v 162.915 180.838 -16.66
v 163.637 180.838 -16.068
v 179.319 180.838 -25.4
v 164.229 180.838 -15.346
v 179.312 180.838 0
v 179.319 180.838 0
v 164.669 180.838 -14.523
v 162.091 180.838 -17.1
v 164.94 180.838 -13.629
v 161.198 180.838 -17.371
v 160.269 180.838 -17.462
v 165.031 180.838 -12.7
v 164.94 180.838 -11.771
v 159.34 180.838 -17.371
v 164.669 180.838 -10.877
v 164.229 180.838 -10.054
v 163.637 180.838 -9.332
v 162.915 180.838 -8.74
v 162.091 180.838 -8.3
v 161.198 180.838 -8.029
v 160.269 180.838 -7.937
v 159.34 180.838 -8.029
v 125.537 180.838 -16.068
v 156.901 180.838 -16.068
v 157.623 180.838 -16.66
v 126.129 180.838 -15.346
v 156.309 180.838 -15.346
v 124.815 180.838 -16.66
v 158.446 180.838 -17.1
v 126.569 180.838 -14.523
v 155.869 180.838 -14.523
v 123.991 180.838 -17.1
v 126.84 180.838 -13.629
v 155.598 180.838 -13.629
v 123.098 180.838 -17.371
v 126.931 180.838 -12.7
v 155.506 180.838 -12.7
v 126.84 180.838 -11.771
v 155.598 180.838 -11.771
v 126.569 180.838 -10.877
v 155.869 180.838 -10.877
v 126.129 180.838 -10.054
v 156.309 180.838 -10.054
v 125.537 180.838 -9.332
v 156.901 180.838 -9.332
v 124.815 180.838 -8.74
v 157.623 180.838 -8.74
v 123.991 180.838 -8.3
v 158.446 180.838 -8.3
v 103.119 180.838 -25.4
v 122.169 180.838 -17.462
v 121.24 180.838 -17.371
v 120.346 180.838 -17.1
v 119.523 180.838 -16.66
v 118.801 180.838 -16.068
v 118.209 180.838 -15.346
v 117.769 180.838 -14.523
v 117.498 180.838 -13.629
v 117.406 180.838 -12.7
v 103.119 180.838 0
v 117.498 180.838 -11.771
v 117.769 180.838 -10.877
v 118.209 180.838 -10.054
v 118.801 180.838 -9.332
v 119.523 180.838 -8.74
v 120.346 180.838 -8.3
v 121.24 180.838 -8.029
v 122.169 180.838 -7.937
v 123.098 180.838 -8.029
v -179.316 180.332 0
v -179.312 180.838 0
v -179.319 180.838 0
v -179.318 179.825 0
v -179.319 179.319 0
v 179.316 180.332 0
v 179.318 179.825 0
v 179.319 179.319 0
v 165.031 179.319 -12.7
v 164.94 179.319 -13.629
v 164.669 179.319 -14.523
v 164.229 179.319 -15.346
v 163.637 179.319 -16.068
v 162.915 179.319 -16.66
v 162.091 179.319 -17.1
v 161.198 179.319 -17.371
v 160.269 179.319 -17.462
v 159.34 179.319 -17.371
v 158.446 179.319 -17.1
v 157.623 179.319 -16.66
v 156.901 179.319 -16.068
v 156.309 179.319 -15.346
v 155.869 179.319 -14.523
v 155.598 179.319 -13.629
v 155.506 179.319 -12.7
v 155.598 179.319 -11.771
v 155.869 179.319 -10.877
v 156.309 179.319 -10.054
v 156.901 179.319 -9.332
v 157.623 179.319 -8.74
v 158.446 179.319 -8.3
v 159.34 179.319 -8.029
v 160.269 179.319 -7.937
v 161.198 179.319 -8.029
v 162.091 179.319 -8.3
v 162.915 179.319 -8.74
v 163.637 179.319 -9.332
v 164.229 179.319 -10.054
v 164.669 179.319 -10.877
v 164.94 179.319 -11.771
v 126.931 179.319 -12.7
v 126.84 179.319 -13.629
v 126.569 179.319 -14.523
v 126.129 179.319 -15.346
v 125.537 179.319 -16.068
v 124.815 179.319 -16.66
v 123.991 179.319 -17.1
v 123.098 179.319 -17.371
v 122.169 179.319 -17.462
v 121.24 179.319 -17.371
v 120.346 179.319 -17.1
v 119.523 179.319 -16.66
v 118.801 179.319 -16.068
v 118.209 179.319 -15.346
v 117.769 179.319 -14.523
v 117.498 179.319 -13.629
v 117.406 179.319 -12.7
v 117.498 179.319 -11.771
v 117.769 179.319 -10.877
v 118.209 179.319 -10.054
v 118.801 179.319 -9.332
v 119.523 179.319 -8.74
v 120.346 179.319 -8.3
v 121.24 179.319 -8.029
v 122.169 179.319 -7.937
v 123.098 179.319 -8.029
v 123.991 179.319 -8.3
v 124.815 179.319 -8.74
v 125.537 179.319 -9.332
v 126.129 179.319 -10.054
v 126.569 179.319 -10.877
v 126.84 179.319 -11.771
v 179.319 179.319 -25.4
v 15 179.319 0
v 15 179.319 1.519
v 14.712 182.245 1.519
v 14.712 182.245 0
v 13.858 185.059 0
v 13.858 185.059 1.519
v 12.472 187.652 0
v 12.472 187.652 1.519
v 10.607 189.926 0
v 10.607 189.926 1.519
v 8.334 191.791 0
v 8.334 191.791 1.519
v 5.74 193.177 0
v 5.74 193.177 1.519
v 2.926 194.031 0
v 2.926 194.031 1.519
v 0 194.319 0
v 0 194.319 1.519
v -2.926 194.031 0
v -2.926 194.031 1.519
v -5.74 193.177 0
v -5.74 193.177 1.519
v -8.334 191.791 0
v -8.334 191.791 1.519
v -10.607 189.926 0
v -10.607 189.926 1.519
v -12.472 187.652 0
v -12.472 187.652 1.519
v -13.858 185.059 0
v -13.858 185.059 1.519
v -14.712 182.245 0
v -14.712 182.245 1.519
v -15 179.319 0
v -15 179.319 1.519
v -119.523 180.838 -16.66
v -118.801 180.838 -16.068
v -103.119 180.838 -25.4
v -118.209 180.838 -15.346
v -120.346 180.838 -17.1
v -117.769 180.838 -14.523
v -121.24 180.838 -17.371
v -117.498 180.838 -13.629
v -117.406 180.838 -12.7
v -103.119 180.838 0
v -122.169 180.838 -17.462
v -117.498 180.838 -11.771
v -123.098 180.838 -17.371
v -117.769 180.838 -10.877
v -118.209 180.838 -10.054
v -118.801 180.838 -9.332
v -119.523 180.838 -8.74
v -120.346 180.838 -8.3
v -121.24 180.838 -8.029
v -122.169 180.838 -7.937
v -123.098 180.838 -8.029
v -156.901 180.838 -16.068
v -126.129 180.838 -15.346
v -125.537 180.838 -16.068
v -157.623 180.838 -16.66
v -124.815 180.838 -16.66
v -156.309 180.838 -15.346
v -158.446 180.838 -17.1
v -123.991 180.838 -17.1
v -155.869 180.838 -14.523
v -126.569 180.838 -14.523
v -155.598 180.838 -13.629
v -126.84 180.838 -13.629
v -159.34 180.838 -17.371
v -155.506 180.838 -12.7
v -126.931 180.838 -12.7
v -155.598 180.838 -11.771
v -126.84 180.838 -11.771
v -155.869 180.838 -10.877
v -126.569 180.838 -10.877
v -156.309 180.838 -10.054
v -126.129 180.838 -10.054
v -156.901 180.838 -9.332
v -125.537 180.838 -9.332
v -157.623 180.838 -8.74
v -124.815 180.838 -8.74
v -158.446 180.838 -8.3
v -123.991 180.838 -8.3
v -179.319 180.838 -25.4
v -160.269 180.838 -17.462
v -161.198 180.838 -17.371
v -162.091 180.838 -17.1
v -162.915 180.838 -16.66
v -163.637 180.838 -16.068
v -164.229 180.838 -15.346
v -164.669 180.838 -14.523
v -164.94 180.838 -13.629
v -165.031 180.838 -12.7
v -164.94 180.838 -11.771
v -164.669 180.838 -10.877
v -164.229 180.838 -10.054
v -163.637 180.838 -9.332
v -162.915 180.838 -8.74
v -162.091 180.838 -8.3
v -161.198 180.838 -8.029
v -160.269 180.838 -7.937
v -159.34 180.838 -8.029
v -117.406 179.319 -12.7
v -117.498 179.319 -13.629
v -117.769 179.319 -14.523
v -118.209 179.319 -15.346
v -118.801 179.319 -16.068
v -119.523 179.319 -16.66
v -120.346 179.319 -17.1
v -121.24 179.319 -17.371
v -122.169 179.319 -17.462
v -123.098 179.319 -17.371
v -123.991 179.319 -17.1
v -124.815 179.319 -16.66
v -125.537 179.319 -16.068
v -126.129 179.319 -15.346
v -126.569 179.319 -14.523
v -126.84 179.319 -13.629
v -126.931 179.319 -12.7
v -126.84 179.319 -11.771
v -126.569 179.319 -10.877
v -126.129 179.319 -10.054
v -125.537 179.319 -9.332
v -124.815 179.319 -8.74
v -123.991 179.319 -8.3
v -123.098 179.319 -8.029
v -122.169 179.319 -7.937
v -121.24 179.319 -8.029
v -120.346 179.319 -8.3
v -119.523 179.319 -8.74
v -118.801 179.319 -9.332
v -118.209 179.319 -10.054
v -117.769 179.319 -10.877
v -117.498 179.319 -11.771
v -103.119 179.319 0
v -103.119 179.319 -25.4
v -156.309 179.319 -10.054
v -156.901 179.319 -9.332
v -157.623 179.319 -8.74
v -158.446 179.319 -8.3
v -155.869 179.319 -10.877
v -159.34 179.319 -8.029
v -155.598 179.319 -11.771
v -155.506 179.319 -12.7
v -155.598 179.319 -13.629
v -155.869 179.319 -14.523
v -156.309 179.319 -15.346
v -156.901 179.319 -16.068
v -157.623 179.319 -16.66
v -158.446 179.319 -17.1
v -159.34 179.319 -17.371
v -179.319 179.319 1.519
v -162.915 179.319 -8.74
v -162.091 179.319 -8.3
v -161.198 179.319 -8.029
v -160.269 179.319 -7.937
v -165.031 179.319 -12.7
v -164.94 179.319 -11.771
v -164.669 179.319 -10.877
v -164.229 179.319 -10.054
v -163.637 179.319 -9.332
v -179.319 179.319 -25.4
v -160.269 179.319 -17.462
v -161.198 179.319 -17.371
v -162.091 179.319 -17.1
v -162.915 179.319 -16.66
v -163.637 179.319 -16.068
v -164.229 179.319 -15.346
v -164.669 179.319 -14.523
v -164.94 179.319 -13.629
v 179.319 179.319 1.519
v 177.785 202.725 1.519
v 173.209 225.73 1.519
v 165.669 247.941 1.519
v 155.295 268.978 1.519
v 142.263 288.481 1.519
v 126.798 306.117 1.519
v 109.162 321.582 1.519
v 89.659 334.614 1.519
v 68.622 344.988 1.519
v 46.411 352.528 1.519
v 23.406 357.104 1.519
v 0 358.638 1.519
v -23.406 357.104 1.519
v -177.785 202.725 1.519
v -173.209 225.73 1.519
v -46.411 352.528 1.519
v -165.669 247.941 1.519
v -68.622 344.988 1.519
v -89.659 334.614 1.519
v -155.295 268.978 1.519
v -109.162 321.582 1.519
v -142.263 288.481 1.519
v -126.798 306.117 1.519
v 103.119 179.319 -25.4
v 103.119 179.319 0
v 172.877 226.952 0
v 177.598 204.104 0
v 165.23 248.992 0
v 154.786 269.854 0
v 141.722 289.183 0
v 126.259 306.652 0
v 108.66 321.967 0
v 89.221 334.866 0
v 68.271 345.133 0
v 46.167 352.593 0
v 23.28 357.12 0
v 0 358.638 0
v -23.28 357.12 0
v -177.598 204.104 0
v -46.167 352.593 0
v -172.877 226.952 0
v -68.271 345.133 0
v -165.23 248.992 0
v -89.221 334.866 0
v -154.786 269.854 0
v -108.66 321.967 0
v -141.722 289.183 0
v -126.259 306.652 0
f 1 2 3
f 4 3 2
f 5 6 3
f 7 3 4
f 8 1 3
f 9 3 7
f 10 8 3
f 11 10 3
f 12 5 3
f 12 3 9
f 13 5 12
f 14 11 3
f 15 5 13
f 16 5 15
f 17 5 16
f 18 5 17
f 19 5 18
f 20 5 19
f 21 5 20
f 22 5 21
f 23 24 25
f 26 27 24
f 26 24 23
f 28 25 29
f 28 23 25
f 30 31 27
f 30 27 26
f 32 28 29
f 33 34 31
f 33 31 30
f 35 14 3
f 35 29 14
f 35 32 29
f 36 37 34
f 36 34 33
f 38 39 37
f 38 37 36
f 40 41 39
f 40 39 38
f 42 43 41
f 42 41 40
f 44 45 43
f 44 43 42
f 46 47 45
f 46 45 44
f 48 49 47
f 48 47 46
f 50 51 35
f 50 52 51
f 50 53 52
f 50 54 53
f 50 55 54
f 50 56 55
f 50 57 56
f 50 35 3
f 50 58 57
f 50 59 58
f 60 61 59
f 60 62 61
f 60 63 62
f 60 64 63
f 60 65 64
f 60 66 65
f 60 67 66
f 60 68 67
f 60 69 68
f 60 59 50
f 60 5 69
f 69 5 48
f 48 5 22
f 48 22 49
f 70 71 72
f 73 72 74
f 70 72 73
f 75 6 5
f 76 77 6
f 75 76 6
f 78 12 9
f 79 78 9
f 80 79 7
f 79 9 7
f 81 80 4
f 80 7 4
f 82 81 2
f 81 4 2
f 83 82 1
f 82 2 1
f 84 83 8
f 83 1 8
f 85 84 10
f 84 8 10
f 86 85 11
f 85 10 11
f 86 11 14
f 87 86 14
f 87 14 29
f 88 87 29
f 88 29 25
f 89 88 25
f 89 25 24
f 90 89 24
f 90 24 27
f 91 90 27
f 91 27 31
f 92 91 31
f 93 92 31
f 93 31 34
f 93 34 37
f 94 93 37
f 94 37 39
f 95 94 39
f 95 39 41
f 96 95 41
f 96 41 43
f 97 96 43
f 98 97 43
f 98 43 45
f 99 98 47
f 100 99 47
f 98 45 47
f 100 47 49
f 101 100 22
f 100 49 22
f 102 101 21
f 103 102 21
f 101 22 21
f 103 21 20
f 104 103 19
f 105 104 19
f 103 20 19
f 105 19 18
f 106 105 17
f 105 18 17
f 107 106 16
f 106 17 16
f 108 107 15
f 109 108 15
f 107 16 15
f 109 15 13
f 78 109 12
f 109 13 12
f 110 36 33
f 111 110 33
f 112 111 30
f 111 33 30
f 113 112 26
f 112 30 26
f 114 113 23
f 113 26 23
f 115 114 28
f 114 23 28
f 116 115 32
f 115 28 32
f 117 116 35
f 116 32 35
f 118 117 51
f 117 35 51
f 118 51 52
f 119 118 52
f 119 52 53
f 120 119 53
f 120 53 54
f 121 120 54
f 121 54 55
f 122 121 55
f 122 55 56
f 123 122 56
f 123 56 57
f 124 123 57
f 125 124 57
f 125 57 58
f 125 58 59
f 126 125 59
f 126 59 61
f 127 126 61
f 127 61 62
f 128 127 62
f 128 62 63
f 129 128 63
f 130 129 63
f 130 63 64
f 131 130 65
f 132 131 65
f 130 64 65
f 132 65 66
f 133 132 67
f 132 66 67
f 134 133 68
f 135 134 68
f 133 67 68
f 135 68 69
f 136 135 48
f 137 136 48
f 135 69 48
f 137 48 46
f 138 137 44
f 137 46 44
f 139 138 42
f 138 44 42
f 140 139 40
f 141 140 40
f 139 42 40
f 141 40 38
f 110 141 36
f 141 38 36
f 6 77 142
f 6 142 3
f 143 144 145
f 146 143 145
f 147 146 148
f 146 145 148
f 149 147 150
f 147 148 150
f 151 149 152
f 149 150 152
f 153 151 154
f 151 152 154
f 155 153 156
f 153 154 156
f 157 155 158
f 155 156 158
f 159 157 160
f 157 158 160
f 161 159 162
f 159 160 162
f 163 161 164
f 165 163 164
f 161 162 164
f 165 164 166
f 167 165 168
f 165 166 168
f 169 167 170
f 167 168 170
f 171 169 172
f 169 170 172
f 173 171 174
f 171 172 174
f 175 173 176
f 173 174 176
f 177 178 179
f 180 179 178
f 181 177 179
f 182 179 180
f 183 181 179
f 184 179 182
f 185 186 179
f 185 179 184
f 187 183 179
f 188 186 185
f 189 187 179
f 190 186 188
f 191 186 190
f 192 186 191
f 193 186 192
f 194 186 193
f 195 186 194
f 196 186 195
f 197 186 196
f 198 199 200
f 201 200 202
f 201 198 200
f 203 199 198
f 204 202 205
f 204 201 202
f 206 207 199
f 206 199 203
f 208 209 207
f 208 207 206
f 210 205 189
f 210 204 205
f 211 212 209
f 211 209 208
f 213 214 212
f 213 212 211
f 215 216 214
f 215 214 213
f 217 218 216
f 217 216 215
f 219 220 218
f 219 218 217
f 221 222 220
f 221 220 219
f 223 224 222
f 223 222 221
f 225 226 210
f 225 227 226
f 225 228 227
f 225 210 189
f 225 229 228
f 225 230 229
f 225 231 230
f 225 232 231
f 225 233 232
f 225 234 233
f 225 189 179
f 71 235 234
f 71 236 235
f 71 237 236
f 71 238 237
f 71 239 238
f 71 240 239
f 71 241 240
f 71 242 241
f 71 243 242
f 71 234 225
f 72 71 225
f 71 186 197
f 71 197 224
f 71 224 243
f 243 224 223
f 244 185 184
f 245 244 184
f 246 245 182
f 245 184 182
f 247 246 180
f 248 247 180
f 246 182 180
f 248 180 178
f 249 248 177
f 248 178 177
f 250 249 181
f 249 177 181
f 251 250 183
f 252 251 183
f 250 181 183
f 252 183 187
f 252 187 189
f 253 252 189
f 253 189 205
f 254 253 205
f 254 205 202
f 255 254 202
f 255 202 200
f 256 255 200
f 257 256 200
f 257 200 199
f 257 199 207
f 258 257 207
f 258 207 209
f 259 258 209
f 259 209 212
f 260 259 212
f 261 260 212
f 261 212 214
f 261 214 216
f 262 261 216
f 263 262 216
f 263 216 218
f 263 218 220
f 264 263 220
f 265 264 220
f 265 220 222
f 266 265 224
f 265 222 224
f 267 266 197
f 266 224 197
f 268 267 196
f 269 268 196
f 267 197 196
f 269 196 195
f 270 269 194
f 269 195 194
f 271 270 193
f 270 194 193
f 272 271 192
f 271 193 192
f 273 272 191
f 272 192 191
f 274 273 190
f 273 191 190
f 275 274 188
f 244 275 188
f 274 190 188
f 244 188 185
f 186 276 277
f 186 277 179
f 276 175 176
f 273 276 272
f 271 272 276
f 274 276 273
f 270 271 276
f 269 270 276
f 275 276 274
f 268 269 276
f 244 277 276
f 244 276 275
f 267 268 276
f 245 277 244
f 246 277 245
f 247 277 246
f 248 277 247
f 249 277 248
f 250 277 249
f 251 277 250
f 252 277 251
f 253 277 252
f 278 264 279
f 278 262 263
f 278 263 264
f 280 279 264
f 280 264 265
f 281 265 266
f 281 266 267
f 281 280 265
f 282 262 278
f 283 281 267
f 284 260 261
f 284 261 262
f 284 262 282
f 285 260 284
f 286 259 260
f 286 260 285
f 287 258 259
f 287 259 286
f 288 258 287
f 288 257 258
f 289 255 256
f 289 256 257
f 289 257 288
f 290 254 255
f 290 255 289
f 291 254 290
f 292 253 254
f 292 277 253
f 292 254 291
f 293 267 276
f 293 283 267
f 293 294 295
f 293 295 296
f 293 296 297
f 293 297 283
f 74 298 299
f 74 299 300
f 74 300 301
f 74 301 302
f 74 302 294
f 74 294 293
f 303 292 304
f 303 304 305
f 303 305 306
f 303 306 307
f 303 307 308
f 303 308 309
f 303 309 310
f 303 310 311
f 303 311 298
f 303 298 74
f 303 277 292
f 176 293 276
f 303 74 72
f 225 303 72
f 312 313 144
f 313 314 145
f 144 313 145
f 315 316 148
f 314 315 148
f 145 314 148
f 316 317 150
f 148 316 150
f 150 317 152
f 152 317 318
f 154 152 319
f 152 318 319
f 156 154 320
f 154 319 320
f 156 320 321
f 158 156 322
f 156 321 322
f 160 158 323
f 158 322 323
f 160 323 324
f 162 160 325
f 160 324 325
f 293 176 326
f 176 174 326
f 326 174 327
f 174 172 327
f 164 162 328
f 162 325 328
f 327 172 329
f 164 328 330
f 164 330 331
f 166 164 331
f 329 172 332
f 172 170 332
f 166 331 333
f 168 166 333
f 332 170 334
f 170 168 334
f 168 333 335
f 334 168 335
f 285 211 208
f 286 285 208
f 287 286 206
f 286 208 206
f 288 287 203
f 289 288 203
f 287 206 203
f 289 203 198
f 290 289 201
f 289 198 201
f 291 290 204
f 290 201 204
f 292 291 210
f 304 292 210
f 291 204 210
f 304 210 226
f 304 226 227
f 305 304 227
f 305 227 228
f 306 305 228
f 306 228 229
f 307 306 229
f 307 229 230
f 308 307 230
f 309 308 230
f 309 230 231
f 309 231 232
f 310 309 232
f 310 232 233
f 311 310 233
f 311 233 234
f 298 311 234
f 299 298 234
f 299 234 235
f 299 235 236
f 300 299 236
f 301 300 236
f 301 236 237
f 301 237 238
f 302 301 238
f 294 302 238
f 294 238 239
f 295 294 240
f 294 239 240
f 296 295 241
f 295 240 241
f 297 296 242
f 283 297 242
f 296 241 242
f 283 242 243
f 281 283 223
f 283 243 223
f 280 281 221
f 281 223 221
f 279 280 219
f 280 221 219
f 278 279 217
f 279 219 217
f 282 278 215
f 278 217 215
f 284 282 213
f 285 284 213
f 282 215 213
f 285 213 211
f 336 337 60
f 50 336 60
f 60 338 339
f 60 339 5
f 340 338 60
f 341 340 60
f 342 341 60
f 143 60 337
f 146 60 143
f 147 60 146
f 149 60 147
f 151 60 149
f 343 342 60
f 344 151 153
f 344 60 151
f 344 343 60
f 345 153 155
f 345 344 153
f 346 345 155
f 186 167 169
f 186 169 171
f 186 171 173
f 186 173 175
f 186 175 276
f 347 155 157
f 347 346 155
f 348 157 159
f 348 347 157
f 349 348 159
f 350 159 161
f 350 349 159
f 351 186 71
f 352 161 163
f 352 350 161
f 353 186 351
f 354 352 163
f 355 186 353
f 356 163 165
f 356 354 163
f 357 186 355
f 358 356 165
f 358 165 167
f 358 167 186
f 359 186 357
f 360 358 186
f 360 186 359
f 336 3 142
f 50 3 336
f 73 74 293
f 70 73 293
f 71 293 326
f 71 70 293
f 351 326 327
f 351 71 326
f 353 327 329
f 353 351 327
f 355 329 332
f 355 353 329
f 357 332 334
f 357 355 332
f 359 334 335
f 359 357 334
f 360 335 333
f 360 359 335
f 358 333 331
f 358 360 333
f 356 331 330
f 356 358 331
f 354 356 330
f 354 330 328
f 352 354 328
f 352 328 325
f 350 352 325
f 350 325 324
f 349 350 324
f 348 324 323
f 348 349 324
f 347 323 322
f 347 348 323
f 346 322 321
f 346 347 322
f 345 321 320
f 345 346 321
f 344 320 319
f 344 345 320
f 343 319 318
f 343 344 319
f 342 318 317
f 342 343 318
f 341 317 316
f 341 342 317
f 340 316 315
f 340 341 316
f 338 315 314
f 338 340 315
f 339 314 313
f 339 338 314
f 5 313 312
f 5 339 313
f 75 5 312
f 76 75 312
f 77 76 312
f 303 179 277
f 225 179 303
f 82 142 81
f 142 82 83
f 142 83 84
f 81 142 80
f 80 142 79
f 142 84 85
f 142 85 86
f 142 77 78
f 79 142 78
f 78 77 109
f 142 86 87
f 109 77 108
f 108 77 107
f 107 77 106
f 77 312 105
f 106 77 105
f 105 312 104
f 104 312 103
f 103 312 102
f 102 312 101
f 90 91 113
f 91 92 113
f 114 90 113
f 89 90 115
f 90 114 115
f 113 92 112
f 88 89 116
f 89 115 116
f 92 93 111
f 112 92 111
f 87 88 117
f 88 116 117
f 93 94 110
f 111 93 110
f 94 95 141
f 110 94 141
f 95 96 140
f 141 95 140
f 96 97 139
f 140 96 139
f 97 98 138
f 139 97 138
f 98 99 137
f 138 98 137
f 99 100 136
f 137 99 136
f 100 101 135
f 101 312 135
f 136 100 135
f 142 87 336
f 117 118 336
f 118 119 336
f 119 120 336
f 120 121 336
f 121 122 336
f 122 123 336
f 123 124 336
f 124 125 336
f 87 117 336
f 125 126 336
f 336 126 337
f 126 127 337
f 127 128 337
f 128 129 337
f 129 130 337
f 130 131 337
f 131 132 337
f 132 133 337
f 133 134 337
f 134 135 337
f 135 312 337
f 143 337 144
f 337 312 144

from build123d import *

# Parameters (mm, degrees)
OUTER_CASING_DEPTH  = 1.51892
SKETCH1_R           = 15
INNER_CUTOUT_DEPTH  = 20
SKETCH4_W           = 76.2
SKETCH4_H           = 1.51892
BOSS_EXTRUDE1_DEPTH = 25.4
SKETCH5_R           = 4.7625
CUT_EXTRUDE1_DEPTH  = 2.51892


with BuildPart() as part:
    # Plate shape → Outer casing (new body)
    with BuildSketch(Plane.XY):
        with BuildLine():
            Line((0, 179.31892), (-179.31892, 179.31892))
            ThreePointArc((-179.31892, 179.31892), (0, 358.63784), (179.31892, 179.31892))
            Line((179.31892, 179.31892), (0, 179.31892))
        make_face()
    extrude(amount=OUTER_CASING_DEPTH)

    # Sketch1 → Inner Cutout (cut)
    with BuildSketch(Plane.XY.offset(1.51892)):
        with Locations((0, 179.31892)):
            Circle(SKETCH1_R)
    extrude(amount=-INNER_CUTOUT_DEPTH, mode=Mode.SUBTRACT)

    # Sketch4 → Boss-Extrude1 (add)
    with BuildSketch(Plane(origin=(0, 0, 0), x_dir=(-1, 0, 0), z_dir=(0, 0, -1))):
        with Locations((-141.21892, 180.07838)):
            Rectangle(SKETCH4_W, SKETCH4_H)
        with Locations((141.21892, 180.07838)):
            Rectangle(SKETCH4_W, SKETCH4_H)
    extrude(amount=BOSS_EXTRUDE1_DEPTH)

    # Sketch5 → Cut-Extrude1 (cut, through all)
    with BuildSketch(Plane(origin=(0, 180.83784, 0), x_dir=(1, 0, 0), z_dir=(0, 1, 0))):
        with Locations((160.26892, 12.7)):
            Circle(SKETCH5_R)
        with Locations((122.16892, 12.7)):
            Circle(SKETCH5_R)
        with Locations((-160.26892, 12.7)):
            Circle(SKETCH5_R)
        with Locations((-122.16892, 12.7)):
            Circle(SKETCH5_R)
    extrude(amount=-CUT_EXTRUDE1_DEPTH, mode=Mode.SUBTRACT)


solid = part.part
